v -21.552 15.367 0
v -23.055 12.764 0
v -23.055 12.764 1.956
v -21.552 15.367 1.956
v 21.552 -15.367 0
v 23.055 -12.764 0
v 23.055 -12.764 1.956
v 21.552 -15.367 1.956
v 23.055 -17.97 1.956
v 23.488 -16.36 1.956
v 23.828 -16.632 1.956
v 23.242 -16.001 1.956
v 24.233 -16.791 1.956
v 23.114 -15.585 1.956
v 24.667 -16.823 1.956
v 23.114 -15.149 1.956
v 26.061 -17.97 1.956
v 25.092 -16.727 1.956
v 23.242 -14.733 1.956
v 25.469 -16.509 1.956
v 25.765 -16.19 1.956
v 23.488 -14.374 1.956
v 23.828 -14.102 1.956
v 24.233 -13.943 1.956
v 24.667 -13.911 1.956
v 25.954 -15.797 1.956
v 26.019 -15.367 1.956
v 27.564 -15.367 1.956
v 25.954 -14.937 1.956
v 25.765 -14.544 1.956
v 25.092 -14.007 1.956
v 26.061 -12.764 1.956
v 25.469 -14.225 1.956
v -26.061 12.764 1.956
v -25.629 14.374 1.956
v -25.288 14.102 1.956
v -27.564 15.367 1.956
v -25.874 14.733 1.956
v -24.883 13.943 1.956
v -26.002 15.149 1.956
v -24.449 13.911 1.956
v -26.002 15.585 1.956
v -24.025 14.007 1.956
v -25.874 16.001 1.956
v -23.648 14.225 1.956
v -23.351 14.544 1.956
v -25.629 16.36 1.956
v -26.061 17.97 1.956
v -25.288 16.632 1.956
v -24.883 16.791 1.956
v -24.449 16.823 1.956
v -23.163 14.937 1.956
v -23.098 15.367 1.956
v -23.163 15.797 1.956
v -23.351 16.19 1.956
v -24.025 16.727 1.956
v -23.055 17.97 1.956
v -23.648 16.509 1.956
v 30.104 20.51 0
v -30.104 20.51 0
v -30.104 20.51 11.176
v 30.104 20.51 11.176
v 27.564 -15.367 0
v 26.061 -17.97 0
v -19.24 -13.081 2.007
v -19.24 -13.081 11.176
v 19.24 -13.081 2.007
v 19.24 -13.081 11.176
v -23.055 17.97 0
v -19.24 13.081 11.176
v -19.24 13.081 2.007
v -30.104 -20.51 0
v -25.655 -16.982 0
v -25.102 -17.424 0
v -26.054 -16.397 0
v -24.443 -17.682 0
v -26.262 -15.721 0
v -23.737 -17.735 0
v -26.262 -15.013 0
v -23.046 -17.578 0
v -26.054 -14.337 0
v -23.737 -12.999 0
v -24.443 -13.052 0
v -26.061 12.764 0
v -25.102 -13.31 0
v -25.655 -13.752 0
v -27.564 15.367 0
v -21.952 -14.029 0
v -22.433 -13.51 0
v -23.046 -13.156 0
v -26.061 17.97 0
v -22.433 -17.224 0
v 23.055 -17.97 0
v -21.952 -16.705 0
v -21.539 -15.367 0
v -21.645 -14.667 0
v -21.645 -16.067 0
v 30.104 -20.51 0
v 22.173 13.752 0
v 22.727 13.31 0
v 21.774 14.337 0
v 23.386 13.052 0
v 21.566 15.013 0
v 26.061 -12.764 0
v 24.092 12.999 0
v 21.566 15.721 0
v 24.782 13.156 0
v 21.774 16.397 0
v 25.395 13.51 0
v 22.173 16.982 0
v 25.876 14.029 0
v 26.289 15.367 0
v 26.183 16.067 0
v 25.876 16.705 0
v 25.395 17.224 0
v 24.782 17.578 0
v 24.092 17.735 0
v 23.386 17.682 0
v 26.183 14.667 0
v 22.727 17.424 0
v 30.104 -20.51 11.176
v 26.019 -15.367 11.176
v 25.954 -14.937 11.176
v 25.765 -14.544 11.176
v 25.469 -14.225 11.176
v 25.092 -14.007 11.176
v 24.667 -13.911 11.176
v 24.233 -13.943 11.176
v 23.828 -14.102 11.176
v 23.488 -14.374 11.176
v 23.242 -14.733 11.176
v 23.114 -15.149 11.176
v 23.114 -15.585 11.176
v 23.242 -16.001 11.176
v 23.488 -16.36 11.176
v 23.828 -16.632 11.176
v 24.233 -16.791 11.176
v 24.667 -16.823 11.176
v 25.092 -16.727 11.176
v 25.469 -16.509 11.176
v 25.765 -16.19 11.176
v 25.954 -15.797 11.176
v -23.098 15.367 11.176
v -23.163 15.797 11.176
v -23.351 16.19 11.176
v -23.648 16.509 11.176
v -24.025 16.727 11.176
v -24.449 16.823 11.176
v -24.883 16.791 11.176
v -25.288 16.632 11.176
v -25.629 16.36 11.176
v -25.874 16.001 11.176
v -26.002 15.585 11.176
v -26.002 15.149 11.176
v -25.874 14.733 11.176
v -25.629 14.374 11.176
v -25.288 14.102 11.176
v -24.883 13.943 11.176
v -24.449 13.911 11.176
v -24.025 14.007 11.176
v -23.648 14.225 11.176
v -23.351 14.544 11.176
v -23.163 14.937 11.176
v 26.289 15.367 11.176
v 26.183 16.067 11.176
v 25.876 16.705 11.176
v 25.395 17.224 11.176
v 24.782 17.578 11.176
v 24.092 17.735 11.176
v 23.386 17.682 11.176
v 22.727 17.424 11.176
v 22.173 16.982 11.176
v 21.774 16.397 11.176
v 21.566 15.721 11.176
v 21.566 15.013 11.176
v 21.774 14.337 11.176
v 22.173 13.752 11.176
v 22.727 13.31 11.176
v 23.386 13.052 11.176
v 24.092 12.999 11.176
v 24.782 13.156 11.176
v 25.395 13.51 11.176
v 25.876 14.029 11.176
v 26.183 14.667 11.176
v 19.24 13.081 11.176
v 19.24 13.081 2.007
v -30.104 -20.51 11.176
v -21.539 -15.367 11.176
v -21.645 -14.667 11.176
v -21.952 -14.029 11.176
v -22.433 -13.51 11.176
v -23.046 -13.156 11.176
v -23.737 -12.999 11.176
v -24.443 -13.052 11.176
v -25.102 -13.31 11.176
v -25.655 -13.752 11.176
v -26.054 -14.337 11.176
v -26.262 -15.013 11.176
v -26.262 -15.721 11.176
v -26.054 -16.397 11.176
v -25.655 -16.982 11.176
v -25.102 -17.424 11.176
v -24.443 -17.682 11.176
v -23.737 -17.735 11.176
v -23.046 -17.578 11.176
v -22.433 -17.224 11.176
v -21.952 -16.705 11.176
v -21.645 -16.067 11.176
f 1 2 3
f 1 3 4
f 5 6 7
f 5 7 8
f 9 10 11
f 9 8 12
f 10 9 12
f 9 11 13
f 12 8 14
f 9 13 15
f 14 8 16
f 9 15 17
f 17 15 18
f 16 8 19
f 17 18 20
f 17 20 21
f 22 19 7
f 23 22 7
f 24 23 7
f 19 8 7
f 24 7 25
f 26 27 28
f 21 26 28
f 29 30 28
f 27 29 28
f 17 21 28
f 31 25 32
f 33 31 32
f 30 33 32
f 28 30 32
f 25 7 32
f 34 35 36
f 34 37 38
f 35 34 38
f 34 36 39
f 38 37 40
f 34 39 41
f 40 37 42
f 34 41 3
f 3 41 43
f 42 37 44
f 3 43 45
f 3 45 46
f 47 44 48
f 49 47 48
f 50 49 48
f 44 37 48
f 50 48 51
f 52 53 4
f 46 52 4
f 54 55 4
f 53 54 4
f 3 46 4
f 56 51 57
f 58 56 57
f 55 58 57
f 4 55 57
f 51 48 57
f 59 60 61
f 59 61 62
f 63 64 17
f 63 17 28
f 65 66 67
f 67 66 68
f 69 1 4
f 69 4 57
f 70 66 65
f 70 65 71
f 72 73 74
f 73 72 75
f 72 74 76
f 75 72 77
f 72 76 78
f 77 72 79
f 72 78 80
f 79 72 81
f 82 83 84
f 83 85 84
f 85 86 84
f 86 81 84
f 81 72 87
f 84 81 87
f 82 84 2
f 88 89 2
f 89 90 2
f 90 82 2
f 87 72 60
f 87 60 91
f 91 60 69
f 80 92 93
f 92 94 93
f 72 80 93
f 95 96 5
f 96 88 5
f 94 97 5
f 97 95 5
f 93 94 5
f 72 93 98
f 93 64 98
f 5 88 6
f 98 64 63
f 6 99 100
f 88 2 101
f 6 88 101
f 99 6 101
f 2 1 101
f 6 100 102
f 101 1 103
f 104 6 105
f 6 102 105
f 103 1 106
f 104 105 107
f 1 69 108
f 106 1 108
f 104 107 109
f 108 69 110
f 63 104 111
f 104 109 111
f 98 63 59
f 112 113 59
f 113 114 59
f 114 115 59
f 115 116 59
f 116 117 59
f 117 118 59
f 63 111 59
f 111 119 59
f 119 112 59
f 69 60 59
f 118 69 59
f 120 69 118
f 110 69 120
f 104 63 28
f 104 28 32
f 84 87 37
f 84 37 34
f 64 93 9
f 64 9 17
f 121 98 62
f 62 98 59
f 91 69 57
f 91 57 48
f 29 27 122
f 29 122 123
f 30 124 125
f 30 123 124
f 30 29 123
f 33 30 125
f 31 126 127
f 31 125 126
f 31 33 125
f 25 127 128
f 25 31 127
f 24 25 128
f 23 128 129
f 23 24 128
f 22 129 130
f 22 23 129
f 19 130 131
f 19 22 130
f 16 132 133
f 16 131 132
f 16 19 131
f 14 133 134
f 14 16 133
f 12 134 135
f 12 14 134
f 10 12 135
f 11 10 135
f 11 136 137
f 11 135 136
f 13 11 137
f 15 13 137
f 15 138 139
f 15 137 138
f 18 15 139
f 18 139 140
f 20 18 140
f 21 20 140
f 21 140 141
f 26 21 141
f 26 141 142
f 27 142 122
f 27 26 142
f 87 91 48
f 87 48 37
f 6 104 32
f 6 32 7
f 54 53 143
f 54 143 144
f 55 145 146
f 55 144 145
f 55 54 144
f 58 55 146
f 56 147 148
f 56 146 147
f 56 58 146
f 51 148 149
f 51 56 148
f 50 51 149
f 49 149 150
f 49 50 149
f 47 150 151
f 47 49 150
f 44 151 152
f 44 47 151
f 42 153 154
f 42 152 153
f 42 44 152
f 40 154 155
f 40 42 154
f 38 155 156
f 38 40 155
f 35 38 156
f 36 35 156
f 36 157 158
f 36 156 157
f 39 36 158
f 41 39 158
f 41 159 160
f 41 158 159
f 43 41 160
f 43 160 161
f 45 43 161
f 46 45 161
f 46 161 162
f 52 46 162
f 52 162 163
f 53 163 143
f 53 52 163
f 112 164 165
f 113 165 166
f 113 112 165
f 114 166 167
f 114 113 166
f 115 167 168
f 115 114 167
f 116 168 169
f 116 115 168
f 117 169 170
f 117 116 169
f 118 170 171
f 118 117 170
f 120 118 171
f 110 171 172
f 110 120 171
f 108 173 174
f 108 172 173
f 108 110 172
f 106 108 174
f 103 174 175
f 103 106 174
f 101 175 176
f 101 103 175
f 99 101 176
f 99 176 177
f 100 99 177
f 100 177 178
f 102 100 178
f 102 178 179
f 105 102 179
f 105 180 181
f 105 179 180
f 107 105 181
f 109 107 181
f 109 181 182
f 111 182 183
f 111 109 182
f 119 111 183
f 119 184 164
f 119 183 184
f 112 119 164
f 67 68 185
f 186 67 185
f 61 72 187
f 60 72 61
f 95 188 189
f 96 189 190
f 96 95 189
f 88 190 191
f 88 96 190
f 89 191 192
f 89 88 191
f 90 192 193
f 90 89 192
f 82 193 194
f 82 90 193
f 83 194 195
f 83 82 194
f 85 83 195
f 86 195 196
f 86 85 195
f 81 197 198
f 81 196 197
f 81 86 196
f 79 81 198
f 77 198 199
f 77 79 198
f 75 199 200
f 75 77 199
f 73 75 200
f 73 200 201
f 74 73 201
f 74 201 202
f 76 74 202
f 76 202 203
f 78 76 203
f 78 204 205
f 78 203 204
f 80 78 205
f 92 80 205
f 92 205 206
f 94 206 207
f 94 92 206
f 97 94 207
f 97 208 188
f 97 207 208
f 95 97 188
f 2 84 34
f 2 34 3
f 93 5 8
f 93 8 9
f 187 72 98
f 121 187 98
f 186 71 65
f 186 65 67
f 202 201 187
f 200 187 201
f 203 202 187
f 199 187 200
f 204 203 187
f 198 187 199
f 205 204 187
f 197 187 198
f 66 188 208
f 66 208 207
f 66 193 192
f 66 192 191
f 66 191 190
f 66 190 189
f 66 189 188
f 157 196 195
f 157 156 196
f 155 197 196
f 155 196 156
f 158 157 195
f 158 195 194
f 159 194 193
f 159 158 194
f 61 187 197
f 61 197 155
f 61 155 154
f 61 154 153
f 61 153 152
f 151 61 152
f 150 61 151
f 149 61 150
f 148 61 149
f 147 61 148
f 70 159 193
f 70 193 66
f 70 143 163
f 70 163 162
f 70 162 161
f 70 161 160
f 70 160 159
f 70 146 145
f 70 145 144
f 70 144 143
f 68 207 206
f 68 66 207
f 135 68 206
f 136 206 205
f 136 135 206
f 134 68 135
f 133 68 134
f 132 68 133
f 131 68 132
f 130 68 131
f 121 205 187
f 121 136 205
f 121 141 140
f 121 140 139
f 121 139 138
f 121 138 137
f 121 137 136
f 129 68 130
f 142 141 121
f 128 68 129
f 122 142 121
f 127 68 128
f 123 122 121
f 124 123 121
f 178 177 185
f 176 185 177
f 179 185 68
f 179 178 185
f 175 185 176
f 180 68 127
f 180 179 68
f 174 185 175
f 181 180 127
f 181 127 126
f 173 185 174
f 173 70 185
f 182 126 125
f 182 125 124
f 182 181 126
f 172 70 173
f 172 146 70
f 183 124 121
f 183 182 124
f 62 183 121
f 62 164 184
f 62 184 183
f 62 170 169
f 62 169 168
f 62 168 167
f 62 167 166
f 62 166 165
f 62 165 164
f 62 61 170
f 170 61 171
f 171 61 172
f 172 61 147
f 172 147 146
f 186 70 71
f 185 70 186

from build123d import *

# Parameters (mm, degrees)
F8_W      = 60.2088514067
F8_H      = 41.021
F9_DEPTH  = 11.176
F6_R      = 2.3749
F7_R      = 2.3749
F10_DEPTH = 12.192
F11_W     = 38.481
F11_H     = 26.162
F12_DEPTH = 9.1694
F13_DEPTH = 1.9558
F3_R      = 1.4605
F5_R      = 1.4605
F14_DEPTH = 12.192
F15_DEPTH = 1.9558


with BuildPart() as f9:
    # F8 (on Top) → F9 (new body)
    with BuildSketch(Plane.XY):
        Rectangle(F8_W, F8_H)
    extrude(amount=F9_DEPTH)

    # F6 (on face) + F7 (on face) → F10 (cut)
    with BuildSketch(Plane.XY):
        with Locations((-23.9141, -15.367)):
            Circle(F6_R)
    with BuildSketch(Plane.XY):
        with Locations((23.9141, 15.367)):
            Circle(F7_R)
    extrude(amount=F10_DEPTH, mode=Mode.SUBTRACT)

    # F11 (on face) → F12 (cut)
    with BuildSketch(Plane.XY.offset(11.176)):
        Rectangle(F11_W, F11_H)
    extrude(amount=-F12_DEPTH, mode=Mode.SUBTRACT)

    # F2 (on Top) → F13 (cut)
    with BuildSketch(Plane.XY):
        Polygon((-26.0612942775, 12.7635), (-23.0550314258, 12.7635), (-21.5519, 15.367), (-23.0550314258, 17.9705), (-26.0612942775, 17.9705), (-27.5644257033, 15.367), align=None)
    extrude(amount=F13_DEPTH, mode=Mode.SUBTRACT)

    # F3 (on face) + F5 (on face) → F14 (cut)
    with BuildSketch(Plane.XY):
        with Locations((-24.5581628517, 15.367)):
            Circle(F3_R)
    with BuildSketch(Plane.XY):
        with Locations((24.5581628517, -15.367)):
            Circle(F5_R)
    extrude(amount=F14_DEPTH, mode=Mode.SUBTRACT)

    # F4 (on face) → F15 (cut)
    with BuildSketch(Plane.XY):
        Polygon((23.0550314258, -17.9705), (26.0612942775, -17.9705), (27.5644257033, -15.367), (26.0612942775, -12.7635), (23.0550314258, -12.7635), (21.5519, -15.367), align=None)
    extrude(amount=F15_DEPTH, mode=Mode.SUBTRACT)


solid = f9.part
